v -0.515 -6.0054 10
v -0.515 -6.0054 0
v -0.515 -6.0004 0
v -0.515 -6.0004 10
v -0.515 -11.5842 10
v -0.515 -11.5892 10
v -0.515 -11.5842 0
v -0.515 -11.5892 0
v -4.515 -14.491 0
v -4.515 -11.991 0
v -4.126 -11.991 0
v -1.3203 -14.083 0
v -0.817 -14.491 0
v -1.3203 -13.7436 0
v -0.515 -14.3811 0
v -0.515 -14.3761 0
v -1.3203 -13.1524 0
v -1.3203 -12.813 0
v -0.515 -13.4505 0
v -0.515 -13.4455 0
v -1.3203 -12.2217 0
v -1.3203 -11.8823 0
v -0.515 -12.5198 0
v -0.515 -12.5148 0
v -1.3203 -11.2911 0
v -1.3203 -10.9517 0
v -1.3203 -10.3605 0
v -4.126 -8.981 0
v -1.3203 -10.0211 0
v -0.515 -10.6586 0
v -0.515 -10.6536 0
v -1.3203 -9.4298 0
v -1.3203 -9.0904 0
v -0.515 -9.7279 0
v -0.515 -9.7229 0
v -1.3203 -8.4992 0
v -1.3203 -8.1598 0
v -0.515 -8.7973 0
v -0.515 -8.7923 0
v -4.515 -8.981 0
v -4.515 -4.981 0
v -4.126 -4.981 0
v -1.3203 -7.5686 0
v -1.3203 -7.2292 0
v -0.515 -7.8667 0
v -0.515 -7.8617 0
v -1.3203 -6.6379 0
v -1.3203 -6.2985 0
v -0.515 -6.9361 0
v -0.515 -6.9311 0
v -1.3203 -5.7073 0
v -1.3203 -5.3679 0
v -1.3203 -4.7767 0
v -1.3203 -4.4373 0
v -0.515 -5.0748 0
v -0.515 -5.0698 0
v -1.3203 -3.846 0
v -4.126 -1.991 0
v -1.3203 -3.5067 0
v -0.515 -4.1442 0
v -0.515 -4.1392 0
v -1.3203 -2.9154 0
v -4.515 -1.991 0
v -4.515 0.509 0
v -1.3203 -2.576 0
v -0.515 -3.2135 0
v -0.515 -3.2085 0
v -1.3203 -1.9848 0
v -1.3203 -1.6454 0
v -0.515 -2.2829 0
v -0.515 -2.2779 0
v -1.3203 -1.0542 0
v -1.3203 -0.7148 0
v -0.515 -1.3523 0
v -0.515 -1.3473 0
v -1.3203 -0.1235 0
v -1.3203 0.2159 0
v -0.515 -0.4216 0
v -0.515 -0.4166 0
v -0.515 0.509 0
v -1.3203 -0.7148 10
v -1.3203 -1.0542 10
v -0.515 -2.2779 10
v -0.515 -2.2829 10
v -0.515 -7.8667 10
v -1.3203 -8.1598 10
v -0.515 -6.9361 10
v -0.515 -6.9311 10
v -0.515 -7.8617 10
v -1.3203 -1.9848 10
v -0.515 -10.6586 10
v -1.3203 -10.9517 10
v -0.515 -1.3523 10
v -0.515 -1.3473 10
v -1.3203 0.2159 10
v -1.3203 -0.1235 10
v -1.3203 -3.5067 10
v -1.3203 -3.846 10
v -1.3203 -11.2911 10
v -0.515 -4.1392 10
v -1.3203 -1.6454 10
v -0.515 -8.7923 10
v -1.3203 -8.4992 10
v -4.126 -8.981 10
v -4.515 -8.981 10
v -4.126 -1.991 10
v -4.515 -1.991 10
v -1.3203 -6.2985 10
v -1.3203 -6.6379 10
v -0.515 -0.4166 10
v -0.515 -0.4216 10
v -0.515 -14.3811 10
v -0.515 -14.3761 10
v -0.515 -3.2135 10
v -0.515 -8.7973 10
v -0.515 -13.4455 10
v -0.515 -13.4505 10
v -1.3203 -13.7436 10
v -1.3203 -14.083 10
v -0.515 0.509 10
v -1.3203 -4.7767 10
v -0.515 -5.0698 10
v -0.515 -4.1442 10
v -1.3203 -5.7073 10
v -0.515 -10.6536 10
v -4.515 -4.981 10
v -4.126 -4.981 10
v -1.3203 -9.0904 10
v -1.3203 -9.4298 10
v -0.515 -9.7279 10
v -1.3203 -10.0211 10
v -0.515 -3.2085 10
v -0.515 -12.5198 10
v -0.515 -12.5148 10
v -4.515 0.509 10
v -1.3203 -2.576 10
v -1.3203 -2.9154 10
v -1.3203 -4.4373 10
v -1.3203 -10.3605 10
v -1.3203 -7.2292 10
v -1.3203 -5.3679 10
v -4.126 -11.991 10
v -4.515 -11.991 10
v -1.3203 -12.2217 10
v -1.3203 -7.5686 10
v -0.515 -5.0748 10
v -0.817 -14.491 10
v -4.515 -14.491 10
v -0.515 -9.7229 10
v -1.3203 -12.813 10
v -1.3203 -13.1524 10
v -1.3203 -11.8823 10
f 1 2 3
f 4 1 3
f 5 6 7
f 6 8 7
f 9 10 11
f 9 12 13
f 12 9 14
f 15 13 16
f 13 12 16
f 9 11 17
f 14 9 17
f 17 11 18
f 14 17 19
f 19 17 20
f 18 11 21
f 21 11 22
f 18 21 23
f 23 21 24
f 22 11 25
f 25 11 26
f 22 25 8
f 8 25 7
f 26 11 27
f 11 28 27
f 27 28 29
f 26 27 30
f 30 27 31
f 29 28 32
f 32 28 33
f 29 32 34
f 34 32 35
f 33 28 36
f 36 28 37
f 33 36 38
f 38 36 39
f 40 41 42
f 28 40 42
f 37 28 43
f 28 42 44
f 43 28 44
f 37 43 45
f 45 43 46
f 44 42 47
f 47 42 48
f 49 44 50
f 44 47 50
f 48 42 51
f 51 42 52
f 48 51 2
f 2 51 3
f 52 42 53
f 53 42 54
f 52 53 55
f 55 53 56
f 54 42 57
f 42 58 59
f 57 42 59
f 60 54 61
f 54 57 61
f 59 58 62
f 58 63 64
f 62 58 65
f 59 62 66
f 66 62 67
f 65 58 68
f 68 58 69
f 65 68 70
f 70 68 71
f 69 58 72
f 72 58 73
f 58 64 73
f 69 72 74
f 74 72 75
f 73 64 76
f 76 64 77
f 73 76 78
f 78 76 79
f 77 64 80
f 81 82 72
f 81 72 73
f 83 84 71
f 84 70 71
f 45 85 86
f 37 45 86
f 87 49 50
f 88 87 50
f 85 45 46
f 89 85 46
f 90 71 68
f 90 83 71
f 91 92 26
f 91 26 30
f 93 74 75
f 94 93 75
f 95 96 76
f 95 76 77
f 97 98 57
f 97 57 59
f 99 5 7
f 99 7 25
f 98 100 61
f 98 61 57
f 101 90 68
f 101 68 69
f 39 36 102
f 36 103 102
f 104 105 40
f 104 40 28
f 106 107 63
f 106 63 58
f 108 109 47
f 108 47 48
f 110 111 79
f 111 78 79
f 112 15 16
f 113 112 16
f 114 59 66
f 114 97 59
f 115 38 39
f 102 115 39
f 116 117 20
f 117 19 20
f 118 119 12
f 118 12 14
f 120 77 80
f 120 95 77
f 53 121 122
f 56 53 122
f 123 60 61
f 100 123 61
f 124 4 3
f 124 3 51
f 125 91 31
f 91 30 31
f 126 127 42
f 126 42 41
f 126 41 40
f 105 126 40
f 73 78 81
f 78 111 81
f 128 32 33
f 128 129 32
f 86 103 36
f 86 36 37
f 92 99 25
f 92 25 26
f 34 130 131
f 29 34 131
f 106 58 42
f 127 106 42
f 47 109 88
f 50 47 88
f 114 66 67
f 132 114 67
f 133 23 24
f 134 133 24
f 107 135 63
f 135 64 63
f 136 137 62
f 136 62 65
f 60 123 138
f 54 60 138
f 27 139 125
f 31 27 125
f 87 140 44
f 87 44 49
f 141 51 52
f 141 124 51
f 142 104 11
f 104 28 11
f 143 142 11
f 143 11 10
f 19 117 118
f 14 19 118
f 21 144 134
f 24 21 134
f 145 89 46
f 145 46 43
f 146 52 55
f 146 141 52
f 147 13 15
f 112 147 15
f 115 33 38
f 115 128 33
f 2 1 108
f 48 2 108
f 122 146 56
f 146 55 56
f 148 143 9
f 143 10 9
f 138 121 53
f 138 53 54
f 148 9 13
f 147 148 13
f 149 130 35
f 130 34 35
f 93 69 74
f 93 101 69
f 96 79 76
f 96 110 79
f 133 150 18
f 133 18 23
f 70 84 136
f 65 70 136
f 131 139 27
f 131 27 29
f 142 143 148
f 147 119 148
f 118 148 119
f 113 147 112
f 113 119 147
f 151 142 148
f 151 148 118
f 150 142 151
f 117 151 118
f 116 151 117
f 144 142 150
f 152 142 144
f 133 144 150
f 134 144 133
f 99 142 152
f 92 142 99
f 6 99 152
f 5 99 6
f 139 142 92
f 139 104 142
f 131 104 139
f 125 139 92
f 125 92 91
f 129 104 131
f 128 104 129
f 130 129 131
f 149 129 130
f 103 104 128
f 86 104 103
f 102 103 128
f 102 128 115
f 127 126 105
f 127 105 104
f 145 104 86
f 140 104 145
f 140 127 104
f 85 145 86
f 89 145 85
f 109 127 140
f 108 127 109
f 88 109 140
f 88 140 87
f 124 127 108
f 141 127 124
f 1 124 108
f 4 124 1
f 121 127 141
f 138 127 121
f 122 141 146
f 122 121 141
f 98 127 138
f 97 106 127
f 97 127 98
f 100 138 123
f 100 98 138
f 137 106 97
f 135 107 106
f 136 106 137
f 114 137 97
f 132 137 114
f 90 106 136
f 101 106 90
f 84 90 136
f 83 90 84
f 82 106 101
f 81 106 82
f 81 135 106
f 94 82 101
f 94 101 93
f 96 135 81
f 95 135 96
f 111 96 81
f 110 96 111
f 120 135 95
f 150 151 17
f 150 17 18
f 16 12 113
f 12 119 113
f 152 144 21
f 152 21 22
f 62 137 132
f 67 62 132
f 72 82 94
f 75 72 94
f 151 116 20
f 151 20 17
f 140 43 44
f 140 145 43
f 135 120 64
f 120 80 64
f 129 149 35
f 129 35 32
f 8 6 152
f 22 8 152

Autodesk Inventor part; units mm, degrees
ref_plane "YZ Plane" through (0, 0, 0) normal (1, 0, 0) x (0, 1, 0)
ref_plane "XZ Plane" through (0, 0, 0) normal (0, 1, 0) x (-1, 0, 0)
ref_plane "XY Plane" through (0, 0, 0) normal (0, 0, 1) x (1, 0, 0)
sketch "Sketch1" plane through (0, 0, 0) normal (0, 0, 1) x (1, 0, 0)
  line L0 (-0.515, 0.509) -> (-4.515, 0.509)
  line L1 (-4.515, -14.491) -> (-0.515, -14.491)
  line L2 (-0.515, -14.491) -> (-0.515, 0.509)
  line L3 (-4.515, -1.991) -> (-4.126, -1.991)
  line L4 (-4.126, -1.991) -> (-4.126, -4.981)
  line L5 (-4.126, -4.981) -> (-4.515, -4.981)
  line L6 (-4.515, -4.981) -> (-4.515, -1.991)
  line L7 (-4.515, -8.981) -> (-4.126, -8.981)
  line L8 (-4.126, -8.981) -> (-4.126, -11.991)
  line L9 (-4.126, -11.991) -> (-4.515, -11.991)
  line L10 (-4.515, -11.991) -> (-4.515, -8.981)
  line L11 (-4.515, 0.509) -> (-4.515, -1.991)
  line L12 (-4.515, -4.981) -> (-4.515, -14.491)
  point P0 (0, 0)
  dimension "d0" = 4
  dimension "d1" = 15
  dimension "d2" = 0.389
  dimension "d3" = 2.99
  dimension "d4" = 4
  dimension "d5" = 2.5
  dimension "d6" = 3.01
extrude "Extrusion1" add sketch "Sketch1" along normal blind 10 contours L2 L1 L12 L9 L8 L7 L5 L4 L3 L11 L0
sketch "Sketch6" plane through (0, 0, 10) normal (0, 0, 1) x (1, 0, 0)
  line L0 (-0.515, 0.509) -> (-0.515, -14.491) projected
  line L1 (-0.515, -0.4166) -> (-1.3203, -0.1235)
  line L2 (-1.3203, -0.1235) -> (-1.3203, 0.0462)
  line L3 (-1.3203, 0.2159) -> (-0.515, 0.509)
  line L4 (-1.3203, 0.2159) -> (-1.3203, 0.0462)
  line L5 (-0.515, 0.509) -> (-0.515, -0.4166)
  line L6 (-0.412, -0.4191) -> (-1.6665, -0.4191) construction
  line L7 (-1.3203, -1.0542) -> (-0.515, -1.3473)
  line L8 (-0.515, -1.3473) -> (-0.515, -0.4216)
  line L9 (-1.3203, -1.0542) -> (-1.3203, -0.8845)
  line L10 (-1.3203, -0.7148) -> (-1.3203, -0.8845)
  line L11 (-0.515, -0.4216) -> (-1.3203, -0.7148)
  line L12 (-0.1629, -1.3498) -> (-1.5742, -1.3498) construction
  line L13 (-1.3203, -2.9154) -> (-0.515, -3.2085)
  line L14 (-0.515, -3.2085) -> (-0.515, -2.2829)
  line L15 (-1.3203, -2.9154) -> (-1.3203, -2.7457)
  line L16 (-1.3203, -2.576) -> (-1.3203, -2.7457)
  line L17 (-0.515, -2.2829) -> (-1.3203, -2.576)
  line L18 (-1.3203, -1.6454) -> (-0.515, -1.3523)
  line L19 (-0.515, -1.3523) -> (-0.515, -2.2779)
  line L20 (-1.3203, -1.6454) -> (-1.3203, -1.8151)
  line L21 (-1.3203, -1.9848) -> (-1.3203, -1.8151)
  line L22 (-0.515, -2.2779) -> (-1.3203, -1.9848)
  line L23 (-0.071, -3.211) -> (-1.4404, -3.211) construction
  line L24 (-1.3203, -6.6379) -> (-0.515, -6.9311)
  line L25 (-0.515, -6.9311) -> (-0.515, -6.0054)
  line L26 (-1.3203, -6.6379) -> (-1.3203, -6.4682)
  line L27 (-1.3203, -6.2985) -> (-1.3203, -6.4682)
  line L28 (-0.515, -6.0054) -> (-1.3203, -6.2985)
  line L29 (-1.3203, -5.3679) -> (-0.515, -5.0748)
  line L30 (-0.515, -5.0748) -> (-0.515, -6.0004)
  line L31 (-1.3203, -5.3679) -> (-1.3203, -5.5376)
  line L32 (-1.3203, -5.7073) -> (-1.3203, -5.5376)
  line L33 (-0.515, -6.0004) -> (-1.3203, -5.7073)
  line L34 (-1.3203, -3.5067) -> (-0.515, -3.2135)
  line L35 (-0.515, -3.2135) -> (-0.515, -4.1392)
  line L36 (-1.3203, -3.5067) -> (-1.3203, -3.6764)
  line L37 (-1.3203, -3.846) -> (-1.3203, -3.6764)
  line L38 (-0.515, -4.1392) -> (-1.3203, -3.846)
  line L39 (-0.515, -4.1442) -> (-1.3203, -4.4373)
  line L40 (-0.515, -5.0698) -> (-0.515, -4.1442)
  line L41 (-1.3203, -4.7767) -> (-0.515, -5.0698)
  line L42 (-1.3203, -4.7767) -> (-1.3203, -4.607)
  line L43 (-1.3203, -4.4373) -> (-1.3203, -4.607)
  line L44 (0.2425, -6.9336) -> (-1.3203, -6.9336) construction
  line L45 (-1.3203, -8.4992) -> (-0.515, -8.7923)
  line L46 (-0.515, -8.7923) -> (-0.515, -7.8667)
  line L47 (-0.515, -7.8667) -> (-1.3203, -8.1598)
  line L48 (-1.3203, -8.1598) -> (-1.3203, -8.3295)
  line L49 (-1.3203, -8.4992) -> (-1.3203, -8.3295)
  line L50 (-1.3203, -7.2292) -> (-0.515, -6.9361)
  line L51 (-1.3203, -7.2292) -> (-1.3203, -7.3989)
  line L52 (-1.3203, -7.5686) -> (-1.3203, -7.3989)
  line L53 (-0.515, -7.8617) -> (-1.3203, -7.5686)
  line L54 (-0.515, -6.9361) -> (-0.515, -7.8617)
  line L55 (-1.3203, -10.9517) -> (-0.515, -10.6586)
  line L56 (-0.515, -10.6586) -> (-0.515, -11.5842)
  line L57 (-1.3203, -10.9517) -> (-1.3203, -11.1214)
  line L58 (-1.3203, -11.2911) -> (-1.3203, -11.1214)
  line L59 (-0.515, -11.5842) -> (-1.3203, -11.2911)
  line L60 (-0.515, -9.7279) -> (-1.3203, -10.0211)
  line L61 (-1.3203, -10.0211) -> (-1.3203, -10.1908)
  line L62 (-1.3203, -10.3605) -> (-1.3203, -10.1908)
  line L63 (-1.3203, -10.3605) -> (-0.515, -10.6536)
  line L64 (-0.515, -10.6536) -> (-0.515, -9.7279)
  line L65 (-0.515, -8.7973) -> (-0.515, -9.7229)
  line L66 (-0.515, -9.7229) -> (-1.3203, -9.4298)
  line L67 (-1.3203, -9.0904) -> (-1.3203, -9.2601)
  line L68 (-1.3203, -9.4298) -> (-1.3203, -9.2601)
  line L69 (-1.3203, -9.0904) -> (-0.515, -8.7973)
  line L70 (-4.515, -8.981) -> (-4.515, -4.981) projected
  line L71 (0.0056, -11.5867) -> (-1.782, -11.5867) construction
  line L72 (-1.3203, -16.5355) -> (-0.515, -16.2424)
  line L73 (-1.3203, -16.5355) -> (-1.3203, -16.7052)
  line L74 (-1.3203, -16.8749) -> (-1.3203, -16.7052)
  line L75 (-0.515, -17.168) -> (-1.3203, -16.8749)
  line L76 (-0.515, -16.2424) -> (-0.515, -17.168)
  line L77 (-0.515, -15.3117) -> (-1.3203, -15.6048)
  line L78 (-1.3203, -15.6048) -> (-1.3203, -15.7745)
  line L79 (-1.3203, -15.9442) -> (-0.515, -16.2374)
  line L80 (-1.3203, -15.9442) -> (-1.3203, -15.7745)
  line L81 (-0.515, -16.2374) -> (-0.515, -15.3117)
  line L82 (-0.515, -14.3811) -> (-0.515, -15.3067)
  line L83 (-0.515, -15.3067) -> (-1.3203, -15.0136)
  line L84 (-1.3203, -15.0136) -> (-1.3203, -14.8439)
  line L85 (-1.3203, -14.6742) -> (-1.3203, -14.8439)
  line L86 (-1.3203, -14.6742) -> (-0.515, -14.3811)
  line L87 (-1.3203, -14.083) -> (-0.515, -14.3761)
  line L88 (-1.3203, -14.083) -> (-1.3203, -13.9133)
  line L89 (-1.3203, -13.7436) -> (-1.3203, -13.9133)
  line L90 (-0.515, -13.4505) -> (-1.3203, -13.7436)
  line L91 (-0.515, -14.3761) -> (-0.515, -13.4505)
  line L92 (-0.515, -13.4455) -> (-1.3203, -13.1524)
  line L93 (-1.3203, -13.1524) -> (-1.3203, -12.9827)
  line L94 (-1.3203, -12.813) -> (-1.3203, -12.9827)
  line L95 (-1.3203, -12.813) -> (-0.515, -12.5198)
  line L96 (-0.515, -12.5198) -> (-0.515, -13.4455)
  line L97 (-1.3203, -12.2217) -> (-0.515, -12.5148)
  line L98 (-1.3203, -12.2217) -> (-1.3203, -12.052)
  line L99 (-1.3203, -11.8823) -> (-1.3203, -12.052)
  line L100 (-0.515, -11.5892) -> (-1.3203, -11.8823)
  line L101 (-0.515, -12.5148) -> (-0.515, -11.5892)
  dimension "d70" = 0
  dimension "d71" = 0
  dimension "d72" = 70
  dimension "d73" = 0.8053
  dimension "d74" = 70
  dimension "d76" = 0.1697
  dimension "d77" = 110
  dimension "d78" = 70
  dimension "d79" = 40
  dimension "d80" = 0.9256
  dimension "d81" = 0.0025
  dimension "d82" = 0.0025
  dimension "d83" = 0.0025
  dimension "d84" = 0.0025
  dimension "d87" = 0.0025
extrude "Extrusion4" cut sketch "Sketch6" against normal through all contours L0 L82 L83 L84 L85 L86 | L0 L87 L88 L89 L90 | L0 L92 L93 L94 L95 | L0 L97 L98 L99 L100 | L0 L59 L58 L57 L55 | L0 L63 L62 L61 L60 | L0 L66 L68 L67 L69 | L0 L45 L49 L48 L47 | L0 L53 L52 L51 L50 | L0 L24 L26 L27 L28 | L0 L33 L32 L31 L29 | L0 L41 L42 L43 L39 | L0 L38 L37 L36 L34 | L0 L13 L15 L16 L17 | L0 L22 L21 L20 L18 | L0 L7 L9 L10 L11 | L0 L1 L2 L4 L3
equation "\"d14\" = 15.81278"
equation "\"d15\" = 20deg"
equation "\"d16\" = 8.01181"
equation "\"d17\" = 10.54185"
equation "\"d18\" = 3.31182"
equation "\"d24\" = 15.81278"
equation "\"d25\" = 20deg"
equation "\"d26\" = 8.01181"
equation "\"d27\" = 10.54185"
equation "\"d28\" = 3.31182"
equation "\"d35\" = 15.81278"
equation "\"d36\" = 20deg"
equation "\"d37\" = 8.01181"
equation "\"d38\" = 10.54185"
equation "\"d39\" = 3.31182"
equation "\"d59\" = 3.35558"
equation "\"d60\" = 20deg"
equation "\"d61\" = 2.55024"
equation "\"d62\" = 3.35558"
equation "\"d63\" = 1.05419"
properties part number "rack2"
